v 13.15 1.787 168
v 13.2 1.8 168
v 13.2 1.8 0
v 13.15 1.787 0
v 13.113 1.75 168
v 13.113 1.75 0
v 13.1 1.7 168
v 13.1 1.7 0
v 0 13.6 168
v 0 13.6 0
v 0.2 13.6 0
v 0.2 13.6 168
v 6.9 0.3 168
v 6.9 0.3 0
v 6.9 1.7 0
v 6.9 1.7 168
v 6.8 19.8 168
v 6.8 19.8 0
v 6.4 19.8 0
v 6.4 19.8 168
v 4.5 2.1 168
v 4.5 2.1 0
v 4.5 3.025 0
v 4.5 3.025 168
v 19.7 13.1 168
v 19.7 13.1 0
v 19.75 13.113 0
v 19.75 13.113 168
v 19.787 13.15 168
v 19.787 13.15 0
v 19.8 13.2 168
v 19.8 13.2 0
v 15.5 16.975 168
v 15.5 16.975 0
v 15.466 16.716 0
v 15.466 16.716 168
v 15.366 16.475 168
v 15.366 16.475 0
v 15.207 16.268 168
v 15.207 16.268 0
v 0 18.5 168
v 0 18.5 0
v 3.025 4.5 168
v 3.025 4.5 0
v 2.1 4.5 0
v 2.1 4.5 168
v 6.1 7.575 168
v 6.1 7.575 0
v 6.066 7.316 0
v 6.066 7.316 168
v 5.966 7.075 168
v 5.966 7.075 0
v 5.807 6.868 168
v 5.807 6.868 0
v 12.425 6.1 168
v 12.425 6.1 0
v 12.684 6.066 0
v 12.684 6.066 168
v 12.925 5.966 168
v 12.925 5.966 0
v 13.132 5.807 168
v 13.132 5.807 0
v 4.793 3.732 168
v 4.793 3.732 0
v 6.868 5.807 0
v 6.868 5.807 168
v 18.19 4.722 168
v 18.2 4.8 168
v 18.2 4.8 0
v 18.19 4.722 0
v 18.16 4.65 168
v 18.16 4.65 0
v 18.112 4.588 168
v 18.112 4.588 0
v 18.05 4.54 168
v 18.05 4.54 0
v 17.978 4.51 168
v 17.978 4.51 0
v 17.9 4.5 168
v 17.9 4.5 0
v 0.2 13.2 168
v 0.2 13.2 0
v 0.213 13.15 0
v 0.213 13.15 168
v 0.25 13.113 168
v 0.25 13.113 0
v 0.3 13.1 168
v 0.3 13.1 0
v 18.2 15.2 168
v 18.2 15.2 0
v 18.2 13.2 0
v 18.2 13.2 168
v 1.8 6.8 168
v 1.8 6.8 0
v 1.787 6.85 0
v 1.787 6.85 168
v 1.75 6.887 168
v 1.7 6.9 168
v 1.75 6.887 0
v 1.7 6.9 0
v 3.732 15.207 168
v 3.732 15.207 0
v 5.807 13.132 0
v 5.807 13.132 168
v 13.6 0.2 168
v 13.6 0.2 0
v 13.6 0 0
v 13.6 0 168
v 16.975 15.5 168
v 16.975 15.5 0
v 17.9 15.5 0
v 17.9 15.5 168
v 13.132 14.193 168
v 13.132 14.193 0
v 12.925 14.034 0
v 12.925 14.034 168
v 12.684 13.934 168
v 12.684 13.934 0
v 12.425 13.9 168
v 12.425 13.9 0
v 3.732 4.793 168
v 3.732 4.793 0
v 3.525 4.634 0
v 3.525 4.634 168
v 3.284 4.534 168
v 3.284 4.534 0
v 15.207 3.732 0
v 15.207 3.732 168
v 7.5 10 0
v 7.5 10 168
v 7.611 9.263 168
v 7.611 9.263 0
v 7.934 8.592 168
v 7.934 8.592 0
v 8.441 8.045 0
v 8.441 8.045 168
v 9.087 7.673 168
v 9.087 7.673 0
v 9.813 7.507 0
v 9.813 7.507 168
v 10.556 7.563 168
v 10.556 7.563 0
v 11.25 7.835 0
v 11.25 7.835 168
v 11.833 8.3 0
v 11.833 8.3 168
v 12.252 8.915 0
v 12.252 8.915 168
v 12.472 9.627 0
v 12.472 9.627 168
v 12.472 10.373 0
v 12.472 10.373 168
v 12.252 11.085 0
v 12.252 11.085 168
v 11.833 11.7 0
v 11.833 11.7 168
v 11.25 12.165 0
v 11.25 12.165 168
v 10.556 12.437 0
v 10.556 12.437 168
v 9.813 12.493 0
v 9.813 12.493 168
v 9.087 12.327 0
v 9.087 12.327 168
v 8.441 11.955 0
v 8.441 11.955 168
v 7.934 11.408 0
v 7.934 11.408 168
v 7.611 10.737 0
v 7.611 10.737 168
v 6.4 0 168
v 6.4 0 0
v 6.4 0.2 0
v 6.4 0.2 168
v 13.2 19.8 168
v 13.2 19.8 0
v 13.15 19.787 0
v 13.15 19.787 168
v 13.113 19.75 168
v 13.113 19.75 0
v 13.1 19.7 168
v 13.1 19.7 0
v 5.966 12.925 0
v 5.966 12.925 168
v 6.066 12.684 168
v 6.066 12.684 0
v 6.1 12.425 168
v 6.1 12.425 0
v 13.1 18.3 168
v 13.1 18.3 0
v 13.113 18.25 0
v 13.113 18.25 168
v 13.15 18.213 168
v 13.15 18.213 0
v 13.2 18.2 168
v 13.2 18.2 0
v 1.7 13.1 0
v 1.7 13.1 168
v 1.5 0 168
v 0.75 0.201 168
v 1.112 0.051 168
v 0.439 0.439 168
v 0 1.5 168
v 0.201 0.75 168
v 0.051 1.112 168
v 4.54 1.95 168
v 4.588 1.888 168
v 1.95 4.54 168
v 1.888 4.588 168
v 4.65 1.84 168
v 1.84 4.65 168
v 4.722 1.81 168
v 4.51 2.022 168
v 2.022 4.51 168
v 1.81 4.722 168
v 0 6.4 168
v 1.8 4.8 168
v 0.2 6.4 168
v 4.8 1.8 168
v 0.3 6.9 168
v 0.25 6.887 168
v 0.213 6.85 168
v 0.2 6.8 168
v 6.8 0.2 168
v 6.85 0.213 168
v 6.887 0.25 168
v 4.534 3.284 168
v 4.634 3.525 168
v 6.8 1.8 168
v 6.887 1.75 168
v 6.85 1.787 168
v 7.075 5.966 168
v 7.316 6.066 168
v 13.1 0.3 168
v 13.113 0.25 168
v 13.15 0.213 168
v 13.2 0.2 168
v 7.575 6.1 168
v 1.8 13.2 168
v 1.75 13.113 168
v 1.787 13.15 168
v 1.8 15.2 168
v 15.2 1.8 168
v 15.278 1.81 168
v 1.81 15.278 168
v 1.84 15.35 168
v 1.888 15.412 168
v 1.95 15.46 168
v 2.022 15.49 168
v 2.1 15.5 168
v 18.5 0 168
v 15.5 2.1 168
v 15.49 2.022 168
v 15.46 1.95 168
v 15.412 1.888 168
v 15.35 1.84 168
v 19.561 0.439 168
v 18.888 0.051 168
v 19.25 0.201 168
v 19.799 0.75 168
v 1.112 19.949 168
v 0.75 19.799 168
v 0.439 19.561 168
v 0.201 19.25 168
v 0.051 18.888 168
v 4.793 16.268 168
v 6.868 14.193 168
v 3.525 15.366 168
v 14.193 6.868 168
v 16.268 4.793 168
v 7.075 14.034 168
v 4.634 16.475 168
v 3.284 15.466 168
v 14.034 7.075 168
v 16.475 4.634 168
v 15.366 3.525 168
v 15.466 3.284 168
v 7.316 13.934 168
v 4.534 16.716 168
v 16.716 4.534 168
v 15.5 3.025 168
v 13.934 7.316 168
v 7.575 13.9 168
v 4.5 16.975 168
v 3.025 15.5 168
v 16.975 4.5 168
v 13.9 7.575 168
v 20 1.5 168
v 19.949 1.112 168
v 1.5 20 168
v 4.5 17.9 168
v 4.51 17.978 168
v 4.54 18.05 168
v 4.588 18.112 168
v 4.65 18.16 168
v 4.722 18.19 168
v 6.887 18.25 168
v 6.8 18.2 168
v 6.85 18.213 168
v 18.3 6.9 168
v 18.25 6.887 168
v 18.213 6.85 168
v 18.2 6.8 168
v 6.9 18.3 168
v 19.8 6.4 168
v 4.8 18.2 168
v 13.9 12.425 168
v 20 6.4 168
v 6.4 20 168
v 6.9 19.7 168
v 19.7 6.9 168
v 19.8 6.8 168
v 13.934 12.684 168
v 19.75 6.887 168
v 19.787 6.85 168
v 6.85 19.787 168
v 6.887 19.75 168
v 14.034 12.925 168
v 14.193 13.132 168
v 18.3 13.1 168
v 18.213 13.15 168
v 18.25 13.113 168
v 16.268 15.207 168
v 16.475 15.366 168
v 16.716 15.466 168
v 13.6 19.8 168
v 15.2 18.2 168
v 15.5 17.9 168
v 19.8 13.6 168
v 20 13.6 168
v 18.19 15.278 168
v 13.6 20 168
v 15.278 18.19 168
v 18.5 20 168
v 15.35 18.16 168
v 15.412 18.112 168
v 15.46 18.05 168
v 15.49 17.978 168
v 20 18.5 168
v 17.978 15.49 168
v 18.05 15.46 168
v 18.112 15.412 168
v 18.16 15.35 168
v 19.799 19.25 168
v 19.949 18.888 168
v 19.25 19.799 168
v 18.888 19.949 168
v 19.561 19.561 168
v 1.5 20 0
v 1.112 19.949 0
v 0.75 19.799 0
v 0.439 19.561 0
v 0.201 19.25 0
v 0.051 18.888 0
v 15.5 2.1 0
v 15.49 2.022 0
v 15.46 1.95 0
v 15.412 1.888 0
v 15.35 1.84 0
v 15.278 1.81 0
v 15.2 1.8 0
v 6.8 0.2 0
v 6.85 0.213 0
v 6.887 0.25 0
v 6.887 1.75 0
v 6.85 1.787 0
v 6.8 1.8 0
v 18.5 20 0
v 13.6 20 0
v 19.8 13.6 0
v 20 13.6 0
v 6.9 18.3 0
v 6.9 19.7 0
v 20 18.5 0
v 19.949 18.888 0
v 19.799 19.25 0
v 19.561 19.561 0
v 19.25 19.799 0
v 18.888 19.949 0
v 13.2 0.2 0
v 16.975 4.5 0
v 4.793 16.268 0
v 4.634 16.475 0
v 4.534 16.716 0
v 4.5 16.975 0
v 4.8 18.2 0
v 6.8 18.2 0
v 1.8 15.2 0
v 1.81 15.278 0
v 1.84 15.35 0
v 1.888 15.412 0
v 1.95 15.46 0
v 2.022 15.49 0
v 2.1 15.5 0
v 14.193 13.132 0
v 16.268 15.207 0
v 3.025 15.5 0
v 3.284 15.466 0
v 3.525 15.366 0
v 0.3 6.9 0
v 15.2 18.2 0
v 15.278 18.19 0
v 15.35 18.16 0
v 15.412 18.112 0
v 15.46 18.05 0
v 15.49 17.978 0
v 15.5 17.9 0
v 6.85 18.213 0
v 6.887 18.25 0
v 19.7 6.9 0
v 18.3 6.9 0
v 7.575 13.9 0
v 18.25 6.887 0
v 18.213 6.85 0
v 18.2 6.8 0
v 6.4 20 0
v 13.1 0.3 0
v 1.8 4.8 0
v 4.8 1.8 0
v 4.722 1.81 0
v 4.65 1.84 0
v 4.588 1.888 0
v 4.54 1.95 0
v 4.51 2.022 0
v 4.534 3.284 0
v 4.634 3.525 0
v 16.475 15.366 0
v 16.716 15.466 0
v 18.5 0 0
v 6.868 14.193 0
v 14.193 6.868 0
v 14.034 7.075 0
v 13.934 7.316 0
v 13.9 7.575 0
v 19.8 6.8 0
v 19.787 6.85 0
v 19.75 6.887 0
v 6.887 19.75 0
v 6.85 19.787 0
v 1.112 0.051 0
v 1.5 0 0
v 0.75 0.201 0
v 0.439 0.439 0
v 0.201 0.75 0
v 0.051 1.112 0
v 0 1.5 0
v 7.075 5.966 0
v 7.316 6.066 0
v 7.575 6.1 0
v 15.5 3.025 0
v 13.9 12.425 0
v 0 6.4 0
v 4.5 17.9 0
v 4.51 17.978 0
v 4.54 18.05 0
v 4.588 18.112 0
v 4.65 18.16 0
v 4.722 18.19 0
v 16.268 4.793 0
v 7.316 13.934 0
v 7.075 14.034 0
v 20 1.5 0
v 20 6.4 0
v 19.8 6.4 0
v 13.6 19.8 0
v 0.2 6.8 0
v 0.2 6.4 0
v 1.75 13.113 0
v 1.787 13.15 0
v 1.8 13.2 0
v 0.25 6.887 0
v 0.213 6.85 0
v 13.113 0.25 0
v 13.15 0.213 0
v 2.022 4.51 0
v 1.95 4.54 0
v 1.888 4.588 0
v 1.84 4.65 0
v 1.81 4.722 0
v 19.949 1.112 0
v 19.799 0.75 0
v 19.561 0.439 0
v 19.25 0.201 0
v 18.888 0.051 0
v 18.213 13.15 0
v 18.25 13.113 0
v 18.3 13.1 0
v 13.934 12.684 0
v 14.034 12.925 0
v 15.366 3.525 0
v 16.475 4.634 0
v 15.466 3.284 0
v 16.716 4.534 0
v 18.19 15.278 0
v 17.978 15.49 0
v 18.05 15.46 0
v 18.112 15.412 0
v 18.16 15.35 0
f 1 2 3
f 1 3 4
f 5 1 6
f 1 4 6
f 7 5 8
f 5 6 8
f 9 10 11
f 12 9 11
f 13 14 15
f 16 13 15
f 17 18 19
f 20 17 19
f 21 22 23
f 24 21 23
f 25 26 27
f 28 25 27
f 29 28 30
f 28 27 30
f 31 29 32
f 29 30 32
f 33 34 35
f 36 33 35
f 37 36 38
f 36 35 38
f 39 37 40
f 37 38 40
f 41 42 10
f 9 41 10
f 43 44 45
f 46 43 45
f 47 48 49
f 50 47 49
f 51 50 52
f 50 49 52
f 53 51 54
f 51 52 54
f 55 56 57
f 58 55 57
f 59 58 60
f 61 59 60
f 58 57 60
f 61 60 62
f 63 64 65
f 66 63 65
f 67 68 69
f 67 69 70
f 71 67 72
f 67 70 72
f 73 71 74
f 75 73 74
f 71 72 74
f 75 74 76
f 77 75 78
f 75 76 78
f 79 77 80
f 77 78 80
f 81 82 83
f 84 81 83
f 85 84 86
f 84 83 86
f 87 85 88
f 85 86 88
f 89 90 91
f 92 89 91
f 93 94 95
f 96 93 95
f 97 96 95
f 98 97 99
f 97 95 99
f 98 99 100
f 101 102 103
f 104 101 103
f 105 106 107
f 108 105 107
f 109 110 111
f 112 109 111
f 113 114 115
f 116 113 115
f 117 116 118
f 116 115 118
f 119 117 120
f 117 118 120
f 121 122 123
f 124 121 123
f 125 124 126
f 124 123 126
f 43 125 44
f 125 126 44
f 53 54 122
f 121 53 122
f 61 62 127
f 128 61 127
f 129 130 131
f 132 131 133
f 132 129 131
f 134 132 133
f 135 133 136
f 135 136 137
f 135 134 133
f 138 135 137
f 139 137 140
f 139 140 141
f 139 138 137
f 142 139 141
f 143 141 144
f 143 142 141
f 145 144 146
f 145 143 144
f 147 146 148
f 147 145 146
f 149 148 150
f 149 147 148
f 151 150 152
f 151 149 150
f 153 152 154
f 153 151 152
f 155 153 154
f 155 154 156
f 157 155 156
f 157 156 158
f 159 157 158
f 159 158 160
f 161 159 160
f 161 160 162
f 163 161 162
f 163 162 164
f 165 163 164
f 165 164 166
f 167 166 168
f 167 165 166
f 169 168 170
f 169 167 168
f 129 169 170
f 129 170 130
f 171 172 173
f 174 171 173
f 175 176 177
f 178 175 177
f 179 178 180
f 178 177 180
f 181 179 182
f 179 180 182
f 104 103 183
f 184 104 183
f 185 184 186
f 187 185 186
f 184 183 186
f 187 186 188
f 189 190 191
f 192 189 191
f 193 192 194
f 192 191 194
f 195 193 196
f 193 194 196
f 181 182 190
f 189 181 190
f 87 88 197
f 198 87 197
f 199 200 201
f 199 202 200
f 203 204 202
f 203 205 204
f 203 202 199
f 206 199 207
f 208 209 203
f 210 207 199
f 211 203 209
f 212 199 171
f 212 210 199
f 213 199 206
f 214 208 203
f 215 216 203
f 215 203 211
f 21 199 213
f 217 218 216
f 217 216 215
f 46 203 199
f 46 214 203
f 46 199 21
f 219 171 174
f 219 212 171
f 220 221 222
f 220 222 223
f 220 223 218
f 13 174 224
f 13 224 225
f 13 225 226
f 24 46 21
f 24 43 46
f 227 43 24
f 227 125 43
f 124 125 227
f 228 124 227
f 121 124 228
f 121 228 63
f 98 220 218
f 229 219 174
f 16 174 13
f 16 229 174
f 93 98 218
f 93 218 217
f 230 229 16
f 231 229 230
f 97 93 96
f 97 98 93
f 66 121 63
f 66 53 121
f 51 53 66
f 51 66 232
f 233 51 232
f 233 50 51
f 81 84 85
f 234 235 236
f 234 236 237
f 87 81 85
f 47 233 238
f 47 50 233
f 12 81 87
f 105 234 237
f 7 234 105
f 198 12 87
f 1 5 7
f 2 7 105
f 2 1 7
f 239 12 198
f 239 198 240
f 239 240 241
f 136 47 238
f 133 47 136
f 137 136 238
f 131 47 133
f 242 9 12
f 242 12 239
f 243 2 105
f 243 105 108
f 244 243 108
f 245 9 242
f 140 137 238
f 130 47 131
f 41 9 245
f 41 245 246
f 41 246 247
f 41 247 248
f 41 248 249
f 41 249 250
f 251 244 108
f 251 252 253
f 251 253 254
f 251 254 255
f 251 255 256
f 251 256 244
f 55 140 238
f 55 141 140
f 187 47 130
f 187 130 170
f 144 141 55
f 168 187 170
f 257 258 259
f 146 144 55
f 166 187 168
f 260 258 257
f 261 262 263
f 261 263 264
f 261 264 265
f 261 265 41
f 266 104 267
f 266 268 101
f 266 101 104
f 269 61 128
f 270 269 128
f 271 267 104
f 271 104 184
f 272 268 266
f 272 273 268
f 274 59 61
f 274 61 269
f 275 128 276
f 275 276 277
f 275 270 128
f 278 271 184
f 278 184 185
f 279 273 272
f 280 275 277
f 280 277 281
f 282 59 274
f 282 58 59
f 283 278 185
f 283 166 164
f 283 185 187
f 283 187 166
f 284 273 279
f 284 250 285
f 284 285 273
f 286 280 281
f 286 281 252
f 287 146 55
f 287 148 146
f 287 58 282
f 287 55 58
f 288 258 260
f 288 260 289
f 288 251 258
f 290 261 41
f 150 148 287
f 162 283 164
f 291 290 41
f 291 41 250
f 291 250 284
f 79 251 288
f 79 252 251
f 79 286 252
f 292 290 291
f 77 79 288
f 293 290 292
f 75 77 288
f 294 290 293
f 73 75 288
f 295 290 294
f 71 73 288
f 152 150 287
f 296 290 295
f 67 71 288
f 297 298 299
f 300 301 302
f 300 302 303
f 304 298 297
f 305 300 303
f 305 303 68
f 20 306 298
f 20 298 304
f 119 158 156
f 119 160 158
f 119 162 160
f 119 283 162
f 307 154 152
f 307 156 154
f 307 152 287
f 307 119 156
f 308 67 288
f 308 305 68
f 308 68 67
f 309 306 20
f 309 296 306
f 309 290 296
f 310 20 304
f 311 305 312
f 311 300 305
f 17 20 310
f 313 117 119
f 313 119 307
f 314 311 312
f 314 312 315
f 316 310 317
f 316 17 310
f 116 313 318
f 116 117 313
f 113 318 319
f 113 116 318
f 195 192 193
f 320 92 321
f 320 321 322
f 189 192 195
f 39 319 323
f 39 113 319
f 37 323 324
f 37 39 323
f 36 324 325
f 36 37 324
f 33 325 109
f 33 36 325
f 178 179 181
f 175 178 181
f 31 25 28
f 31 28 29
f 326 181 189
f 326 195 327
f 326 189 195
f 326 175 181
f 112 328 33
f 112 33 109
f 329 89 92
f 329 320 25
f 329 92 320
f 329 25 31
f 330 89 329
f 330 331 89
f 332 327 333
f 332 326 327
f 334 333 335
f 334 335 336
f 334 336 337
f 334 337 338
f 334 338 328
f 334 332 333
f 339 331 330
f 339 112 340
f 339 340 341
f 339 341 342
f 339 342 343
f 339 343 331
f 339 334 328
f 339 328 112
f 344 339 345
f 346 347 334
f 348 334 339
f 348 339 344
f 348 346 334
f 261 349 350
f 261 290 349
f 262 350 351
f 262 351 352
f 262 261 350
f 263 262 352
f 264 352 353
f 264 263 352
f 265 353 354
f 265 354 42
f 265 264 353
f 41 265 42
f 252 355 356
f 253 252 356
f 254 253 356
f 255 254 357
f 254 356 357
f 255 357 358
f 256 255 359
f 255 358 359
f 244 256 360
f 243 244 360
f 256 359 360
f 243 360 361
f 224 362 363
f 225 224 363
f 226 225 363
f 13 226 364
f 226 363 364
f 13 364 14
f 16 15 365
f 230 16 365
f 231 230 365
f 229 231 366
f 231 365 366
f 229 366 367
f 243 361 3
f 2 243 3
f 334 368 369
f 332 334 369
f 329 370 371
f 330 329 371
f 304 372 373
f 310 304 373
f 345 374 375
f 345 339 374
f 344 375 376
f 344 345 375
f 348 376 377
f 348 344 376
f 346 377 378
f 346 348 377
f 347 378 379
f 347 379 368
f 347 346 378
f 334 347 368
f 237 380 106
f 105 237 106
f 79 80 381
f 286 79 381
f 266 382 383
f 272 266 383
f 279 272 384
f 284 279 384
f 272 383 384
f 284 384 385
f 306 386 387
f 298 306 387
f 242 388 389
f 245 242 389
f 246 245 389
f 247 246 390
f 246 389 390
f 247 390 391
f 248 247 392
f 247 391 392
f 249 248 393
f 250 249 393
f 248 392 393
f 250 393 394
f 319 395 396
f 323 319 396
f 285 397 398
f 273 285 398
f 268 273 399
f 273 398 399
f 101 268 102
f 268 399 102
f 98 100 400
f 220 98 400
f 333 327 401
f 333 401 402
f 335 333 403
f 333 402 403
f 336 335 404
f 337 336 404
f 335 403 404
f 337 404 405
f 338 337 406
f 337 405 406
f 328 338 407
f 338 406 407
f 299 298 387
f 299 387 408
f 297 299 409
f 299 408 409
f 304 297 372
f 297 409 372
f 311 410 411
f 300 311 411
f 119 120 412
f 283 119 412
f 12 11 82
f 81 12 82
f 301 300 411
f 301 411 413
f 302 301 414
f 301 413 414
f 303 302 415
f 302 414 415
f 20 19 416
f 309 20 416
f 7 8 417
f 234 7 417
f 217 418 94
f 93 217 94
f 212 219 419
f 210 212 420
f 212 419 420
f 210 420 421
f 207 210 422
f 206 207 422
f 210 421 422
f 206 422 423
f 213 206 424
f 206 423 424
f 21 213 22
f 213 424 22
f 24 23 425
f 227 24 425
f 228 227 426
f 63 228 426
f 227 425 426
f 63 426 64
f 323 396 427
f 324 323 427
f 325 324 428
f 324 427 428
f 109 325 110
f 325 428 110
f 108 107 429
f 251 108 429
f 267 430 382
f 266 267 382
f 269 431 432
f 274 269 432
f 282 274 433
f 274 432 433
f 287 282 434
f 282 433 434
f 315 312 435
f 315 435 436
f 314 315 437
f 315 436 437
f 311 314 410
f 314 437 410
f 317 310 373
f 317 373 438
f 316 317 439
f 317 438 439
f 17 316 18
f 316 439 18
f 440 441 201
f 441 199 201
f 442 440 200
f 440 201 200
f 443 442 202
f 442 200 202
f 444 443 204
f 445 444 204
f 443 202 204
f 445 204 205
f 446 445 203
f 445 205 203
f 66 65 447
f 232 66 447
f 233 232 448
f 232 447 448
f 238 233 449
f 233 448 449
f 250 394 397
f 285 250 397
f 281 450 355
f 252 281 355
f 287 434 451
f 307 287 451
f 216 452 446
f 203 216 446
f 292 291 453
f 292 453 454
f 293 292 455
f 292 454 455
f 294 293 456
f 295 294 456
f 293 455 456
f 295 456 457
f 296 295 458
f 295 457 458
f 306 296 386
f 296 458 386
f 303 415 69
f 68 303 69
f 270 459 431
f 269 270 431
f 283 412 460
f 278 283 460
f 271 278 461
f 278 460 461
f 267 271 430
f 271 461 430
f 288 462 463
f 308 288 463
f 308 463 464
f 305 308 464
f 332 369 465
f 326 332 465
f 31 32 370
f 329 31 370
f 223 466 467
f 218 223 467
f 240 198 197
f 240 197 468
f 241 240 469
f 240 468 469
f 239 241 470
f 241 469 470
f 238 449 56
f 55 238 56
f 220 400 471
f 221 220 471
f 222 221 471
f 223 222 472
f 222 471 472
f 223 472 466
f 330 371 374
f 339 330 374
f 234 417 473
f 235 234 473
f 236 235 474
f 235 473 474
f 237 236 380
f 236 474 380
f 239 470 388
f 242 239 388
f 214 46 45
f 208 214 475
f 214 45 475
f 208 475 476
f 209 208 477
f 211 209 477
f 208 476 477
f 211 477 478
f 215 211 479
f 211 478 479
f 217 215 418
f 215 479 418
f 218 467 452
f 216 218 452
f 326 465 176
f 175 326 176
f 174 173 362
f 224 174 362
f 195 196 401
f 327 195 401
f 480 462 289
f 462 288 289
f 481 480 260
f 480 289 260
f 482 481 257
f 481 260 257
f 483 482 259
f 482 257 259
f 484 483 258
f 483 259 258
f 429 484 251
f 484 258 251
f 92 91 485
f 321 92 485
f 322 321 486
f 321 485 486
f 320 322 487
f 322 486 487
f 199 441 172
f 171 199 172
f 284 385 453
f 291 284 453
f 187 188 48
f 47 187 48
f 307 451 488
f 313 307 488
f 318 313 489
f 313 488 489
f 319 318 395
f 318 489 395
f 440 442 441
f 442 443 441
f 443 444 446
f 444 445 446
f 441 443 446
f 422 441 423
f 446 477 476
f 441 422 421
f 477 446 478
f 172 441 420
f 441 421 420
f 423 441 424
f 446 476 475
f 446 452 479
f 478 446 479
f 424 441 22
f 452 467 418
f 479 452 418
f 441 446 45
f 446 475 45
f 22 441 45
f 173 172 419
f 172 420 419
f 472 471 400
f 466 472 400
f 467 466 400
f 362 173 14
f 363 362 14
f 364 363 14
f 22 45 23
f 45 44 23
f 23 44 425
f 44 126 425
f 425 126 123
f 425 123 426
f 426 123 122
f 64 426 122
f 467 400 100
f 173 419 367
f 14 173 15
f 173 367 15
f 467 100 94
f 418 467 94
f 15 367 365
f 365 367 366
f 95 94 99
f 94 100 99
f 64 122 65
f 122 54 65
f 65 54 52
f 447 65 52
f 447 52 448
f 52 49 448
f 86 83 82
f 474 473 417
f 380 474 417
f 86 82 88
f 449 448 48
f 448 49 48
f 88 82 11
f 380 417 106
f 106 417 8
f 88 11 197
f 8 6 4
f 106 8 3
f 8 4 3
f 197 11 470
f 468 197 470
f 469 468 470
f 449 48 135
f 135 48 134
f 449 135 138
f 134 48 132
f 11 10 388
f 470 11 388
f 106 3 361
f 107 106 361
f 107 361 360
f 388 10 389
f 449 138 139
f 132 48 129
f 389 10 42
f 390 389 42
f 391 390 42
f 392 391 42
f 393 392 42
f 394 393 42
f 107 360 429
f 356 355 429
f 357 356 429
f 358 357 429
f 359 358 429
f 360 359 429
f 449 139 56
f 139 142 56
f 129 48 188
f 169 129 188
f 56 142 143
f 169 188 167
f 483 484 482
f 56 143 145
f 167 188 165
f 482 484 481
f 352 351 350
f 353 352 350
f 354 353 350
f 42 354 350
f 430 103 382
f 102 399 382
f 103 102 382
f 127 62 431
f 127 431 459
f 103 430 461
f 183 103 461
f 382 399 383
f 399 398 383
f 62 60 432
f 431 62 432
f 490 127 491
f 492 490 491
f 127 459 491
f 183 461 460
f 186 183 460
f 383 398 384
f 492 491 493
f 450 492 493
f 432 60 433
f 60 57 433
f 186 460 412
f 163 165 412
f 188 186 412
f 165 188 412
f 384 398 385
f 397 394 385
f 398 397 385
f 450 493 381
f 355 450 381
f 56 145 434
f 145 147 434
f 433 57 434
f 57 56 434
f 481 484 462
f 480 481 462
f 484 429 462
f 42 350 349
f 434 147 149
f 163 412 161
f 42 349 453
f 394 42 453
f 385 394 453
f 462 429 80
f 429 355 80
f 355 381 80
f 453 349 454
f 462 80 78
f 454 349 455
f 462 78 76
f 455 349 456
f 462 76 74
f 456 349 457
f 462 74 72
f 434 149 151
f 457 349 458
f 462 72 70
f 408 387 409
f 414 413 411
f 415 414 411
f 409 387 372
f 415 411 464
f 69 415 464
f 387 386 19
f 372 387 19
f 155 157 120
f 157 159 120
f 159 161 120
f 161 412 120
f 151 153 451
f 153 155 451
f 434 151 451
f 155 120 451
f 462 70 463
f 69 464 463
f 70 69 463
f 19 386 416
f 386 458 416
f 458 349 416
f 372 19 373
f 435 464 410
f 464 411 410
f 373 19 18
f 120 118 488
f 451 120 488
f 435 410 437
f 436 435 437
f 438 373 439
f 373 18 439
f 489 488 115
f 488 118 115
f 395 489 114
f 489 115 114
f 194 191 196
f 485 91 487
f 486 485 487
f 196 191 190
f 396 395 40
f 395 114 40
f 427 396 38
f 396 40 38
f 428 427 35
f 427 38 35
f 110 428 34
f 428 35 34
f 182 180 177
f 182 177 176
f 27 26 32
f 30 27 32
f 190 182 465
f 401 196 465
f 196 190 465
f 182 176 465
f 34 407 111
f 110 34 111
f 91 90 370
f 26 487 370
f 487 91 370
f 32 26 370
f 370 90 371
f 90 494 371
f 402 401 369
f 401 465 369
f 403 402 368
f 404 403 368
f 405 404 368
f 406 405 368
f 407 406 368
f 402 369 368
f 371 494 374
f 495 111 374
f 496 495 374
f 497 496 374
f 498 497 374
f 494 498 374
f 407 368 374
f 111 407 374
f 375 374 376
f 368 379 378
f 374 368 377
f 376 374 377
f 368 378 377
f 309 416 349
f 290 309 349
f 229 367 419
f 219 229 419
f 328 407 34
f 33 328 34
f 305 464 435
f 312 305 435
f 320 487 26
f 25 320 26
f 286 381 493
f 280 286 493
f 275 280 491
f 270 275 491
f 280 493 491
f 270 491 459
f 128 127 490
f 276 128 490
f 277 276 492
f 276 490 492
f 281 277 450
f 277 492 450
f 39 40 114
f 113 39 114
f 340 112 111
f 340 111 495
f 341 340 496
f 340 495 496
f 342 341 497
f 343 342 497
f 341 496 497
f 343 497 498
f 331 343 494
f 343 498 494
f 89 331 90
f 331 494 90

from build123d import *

# Parameters (mm, degrees)
SKETCH_1_R      = 2.5
EXTRUDE_1_DEPTH = 168
FILLET_1_R      = 1.5


with BuildPart() as part:
    # 草图1 → 凸台-拉伸1 (new body)
    with BuildSketch(Plane.XY):
        with BuildLine():
            Line((20, 13.6), (20, 20))
            Line((20, 20), (13.6, 20))
            Line((13.6, 20), (13.6, 19.8))
            Line((13.6, 19.8), (13.2, 19.8))
            ThreePointArc((13.2, 19.8), (13.129289322, 19.770710678), (13.1, 19.7))
            Line((13.1, 19.7), (13.1, 18.3))
            ThreePointArc((13.1, 18.3), (13.129289322, 18.229289322), (13.2, 18.2))
            Line((13.2, 18.2), (15.2, 18.2))
            ThreePointArc((15.2, 18.2), (15.412132034, 18.112132034), (15.5, 17.9))
            Line((15.5, 17.9), (15.5, 16.974873734))
            ThreePointArc((15.5, 16.974873734), (15.423879533, 16.592190302), (15.207106781, 16.267766953))
            Line((15.207106781, 16.267766953), (13.132233047, 14.192893219))
            ThreePointArc((13.132233047, 14.192893219), (12.807809698, 13.976120467), (12.425126266, 13.9))
            Line((12.425126266, 13.9), (7.574873734, 13.9))
            ThreePointArc((7.574873734, 13.9), (7.192190302, 13.976120467), (6.867766953, 14.192893219))
            Line((6.867766953, 14.192893219), (4.792893219, 16.267766953))
            ThreePointArc((4.792893219, 16.267766953), (4.576120467, 16.592190302), (4.5, 16.974873734))
            Line((4.5, 16.974873734), (4.5, 17.9))
            ThreePointArc((4.5, 17.9), (4.587867966, 18.112132034), (4.8, 18.2))
            Line((4.8, 18.2), (6.8, 18.2))
            ThreePointArc((6.8, 18.2), (6.870710678, 18.229289322), (6.9, 18.3))
            Line((6.9, 18.3), (6.9, 19.7))
            ThreePointArc((6.9, 19.7), (6.870710678, 19.770710678), (6.8, 19.8))
            Line((6.8, 19.8), (6.4, 19.8))
            Line((6.4, 19.8), (6.4, 20))
            Line((6.4, 20), (0, 20))
            Line((0, 20), (0, 13.6))
            Line((0, 13.6), (0.2, 13.6))
            Line((0.2, 13.6), (0.2, 13.2))
            ThreePointArc((0.2, 13.2), (0.229289322, 13.129289322), (0.3, 13.1))
            Line((0.3, 13.1), (1.7, 13.1))
            ThreePointArc((1.7, 13.1), (1.770710678, 13.129289322), (1.8, 13.2))
            Line((1.8, 13.2), (1.8, 15.2))
            ThreePointArc((1.8, 15.2), (1.887867966, 15.412132034), (2.1, 15.5))
            Line((2.1, 15.5), (3.025126266, 15.5))
            ThreePointArc((3.025126266, 15.5), (3.407809698, 15.423879533), (3.732233047, 15.207106781))
            Line((3.732233047, 15.207106781), (5.807106781, 13.132233047))
            ThreePointArc((5.807106781, 13.132233047), (6.023879533, 12.807809698), (6.1, 12.425126266))
            Line((6.1, 12.425126266), (6.1, 7.574873734))
            ThreePointArc((6.1, 7.574873734), (6.023879533, 7.192190302), (5.807106781, 6.867766953))
            Line((5.807106781, 6.867766953), (3.732233047, 4.792893219))
            ThreePointArc((3.732233047, 4.792893219), (3.407809698, 4.576120467), (3.025126266, 4.5))
            Line((3.025126266, 4.5), (2.1, 4.5))
            ThreePointArc((2.1, 4.5), (1.887867966, 4.587867966), (1.8, 4.8))
            Line((1.8, 4.8), (1.8, 6.8))
            ThreePointArc((1.8, 6.8), (1.770710678, 6.870710678), (1.7, 6.9))
            Line((1.7, 6.9), (0.3, 6.9))
            ThreePointArc((0.3, 6.9), (0.229289322, 6.870710678), (0.2, 6.8))
            Line((0.2, 6.8), (0.2, 6.4))
            Line((0.2, 6.4), (0, 6.4))
            Line((0, 6.4), (0, 0))
            Line((0, 0), (6.4, 0))
            Line((6.4, 0), (6.4, 0.2))
            Line((6.4, 0.2), (6.8, 0.2))
            ThreePointArc((6.8, 0.2), (6.870710678, 0.229289322), (6.9, 0.3))
            Line((6.9, 0.3), (6.9, 1.7))
            ThreePointArc((6.9, 1.7), (6.870710678, 1.770710678), (6.8, 1.8))
            Line((6.8, 1.8), (4.8, 1.8))
            ThreePointArc((4.8, 1.8), (4.587867966, 1.887867966), (4.5, 2.1))
            Line((4.5, 2.1), (4.5, 3.025126266))
            ThreePointArc((4.5, 3.025126266), (4.576120467, 3.407809698), (4.792893219, 3.732233047))
            Line((4.792893219, 3.732233047), (6.867766953, 5.807106781))
            ThreePointArc((6.867766953, 5.807106781), (7.192190302, 6.023879533), (7.574873734, 6.1))
            Line((7.574873734, 6.1), (12.425126266, 6.1))
            ThreePointArc((12.425126266, 6.1), (12.807809698, 6.023879533), (13.132233047, 5.807106781))
            Line((13.132233047, 5.807106781), (15.207106781, 3.732233047))
            ThreePointArc((15.207106781, 3.732233047), (15.423879533, 3.407809698), (15.5, 3.025126266))
            Line((15.5, 3.025126266), (15.5, 2.1))
            ThreePointArc((15.5, 2.1), (15.412132034, 1.887867966), (15.2, 1.8))
            Line((15.2, 1.8), (13.2, 1.8))
            ThreePointArc((13.2, 1.8), (13.129289322, 1.770710678), (13.1, 1.7))
            Line((13.1, 1.7), (13.1, 0.3))
            ThreePointArc((13.1, 0.3), (13.129289322, 0.229289322), (13.2, 0.2))
            Line((13.2, 0.2), (13.6, 0.2))
            Line((13.6, 0.2), (13.6, 0))
            Line((13.6, 0), (20, 0))
            Line((20, 0), (20, 6.4))
            Line((20, 6.4), (19.8, 6.4))
            Line((19.8, 6.4), (19.8, 6.8))
            ThreePointArc((19.8, 6.8), (19.770710678, 6.870710678), (19.7, 6.9))
            Line((19.7, 6.9), (18.3, 6.9))
            ThreePointArc((18.3, 6.9), (18.229289322, 6.870710678), (18.2, 6.8))
            Line((18.2, 6.8), (18.2, 4.8))
            ThreePointArc((18.2, 4.8), (18.112132034, 4.587867966), (17.9, 4.5))
            Line((17.9, 4.5), (16.974873734, 4.5))
            ThreePointArc((16.974873734, 4.5), (16.592190302, 4.576120467), (16.267766953, 4.792893219))
            Line((16.267766953, 4.792893219), (14.192893219, 6.867766953))
            ThreePointArc((14.192893219, 6.867766953), (13.976120467, 7.192190302), (13.9, 7.574873734))
            Line((13.9, 7.574873734), (13.9, 12.425126266))
            ThreePointArc((13.9, 12.425126266), (13.976120467, 12.807809698), (14.192893219, 13.132233047))
            Line((14.192893219, 13.132233047), (16.267766953, 15.207106781))
            ThreePointArc((16.267766953, 15.207106781), (16.592190302, 15.423879533), (16.974873734, 15.5))
            Line((16.974873734, 15.5), (17.9, 15.5))
            ThreePointArc((17.9, 15.5), (18.112132034, 15.412132034), (18.2, 15.2))
            Line((18.2, 15.2), (18.2, 13.2))
            ThreePointArc((18.2, 13.2), (18.229289322, 13.129289322), (18.3, 13.1))
            Line((18.3, 13.1), (19.7, 13.1))
            ThreePointArc((19.7, 13.1), (19.770710678, 13.129289322), (19.8, 13.2))
            Line((19.8, 13.2), (19.8, 13.6))
            Line((19.8, 13.6), (20, 13.6))
        make_face()
        with Locations(Location((10, 10, 0), (0, 0, 180))):
            Circle(SKETCH_1_R, mode=Mode.SUBTRACT)
    extrude(amount=EXTRUDE_1_DEPTH)

    # 圆角1
    fillet_1_edges = [part.edges().sort_by_distance(p)[0] for p in [
        (0, 0, 84),
        (0, 20, 84),
        (20, 20, 84),
        (20, 0, 84),
    ]]
    fillet(fillet_1_edges, radius=FILLET_1_R)


solid = part.part
